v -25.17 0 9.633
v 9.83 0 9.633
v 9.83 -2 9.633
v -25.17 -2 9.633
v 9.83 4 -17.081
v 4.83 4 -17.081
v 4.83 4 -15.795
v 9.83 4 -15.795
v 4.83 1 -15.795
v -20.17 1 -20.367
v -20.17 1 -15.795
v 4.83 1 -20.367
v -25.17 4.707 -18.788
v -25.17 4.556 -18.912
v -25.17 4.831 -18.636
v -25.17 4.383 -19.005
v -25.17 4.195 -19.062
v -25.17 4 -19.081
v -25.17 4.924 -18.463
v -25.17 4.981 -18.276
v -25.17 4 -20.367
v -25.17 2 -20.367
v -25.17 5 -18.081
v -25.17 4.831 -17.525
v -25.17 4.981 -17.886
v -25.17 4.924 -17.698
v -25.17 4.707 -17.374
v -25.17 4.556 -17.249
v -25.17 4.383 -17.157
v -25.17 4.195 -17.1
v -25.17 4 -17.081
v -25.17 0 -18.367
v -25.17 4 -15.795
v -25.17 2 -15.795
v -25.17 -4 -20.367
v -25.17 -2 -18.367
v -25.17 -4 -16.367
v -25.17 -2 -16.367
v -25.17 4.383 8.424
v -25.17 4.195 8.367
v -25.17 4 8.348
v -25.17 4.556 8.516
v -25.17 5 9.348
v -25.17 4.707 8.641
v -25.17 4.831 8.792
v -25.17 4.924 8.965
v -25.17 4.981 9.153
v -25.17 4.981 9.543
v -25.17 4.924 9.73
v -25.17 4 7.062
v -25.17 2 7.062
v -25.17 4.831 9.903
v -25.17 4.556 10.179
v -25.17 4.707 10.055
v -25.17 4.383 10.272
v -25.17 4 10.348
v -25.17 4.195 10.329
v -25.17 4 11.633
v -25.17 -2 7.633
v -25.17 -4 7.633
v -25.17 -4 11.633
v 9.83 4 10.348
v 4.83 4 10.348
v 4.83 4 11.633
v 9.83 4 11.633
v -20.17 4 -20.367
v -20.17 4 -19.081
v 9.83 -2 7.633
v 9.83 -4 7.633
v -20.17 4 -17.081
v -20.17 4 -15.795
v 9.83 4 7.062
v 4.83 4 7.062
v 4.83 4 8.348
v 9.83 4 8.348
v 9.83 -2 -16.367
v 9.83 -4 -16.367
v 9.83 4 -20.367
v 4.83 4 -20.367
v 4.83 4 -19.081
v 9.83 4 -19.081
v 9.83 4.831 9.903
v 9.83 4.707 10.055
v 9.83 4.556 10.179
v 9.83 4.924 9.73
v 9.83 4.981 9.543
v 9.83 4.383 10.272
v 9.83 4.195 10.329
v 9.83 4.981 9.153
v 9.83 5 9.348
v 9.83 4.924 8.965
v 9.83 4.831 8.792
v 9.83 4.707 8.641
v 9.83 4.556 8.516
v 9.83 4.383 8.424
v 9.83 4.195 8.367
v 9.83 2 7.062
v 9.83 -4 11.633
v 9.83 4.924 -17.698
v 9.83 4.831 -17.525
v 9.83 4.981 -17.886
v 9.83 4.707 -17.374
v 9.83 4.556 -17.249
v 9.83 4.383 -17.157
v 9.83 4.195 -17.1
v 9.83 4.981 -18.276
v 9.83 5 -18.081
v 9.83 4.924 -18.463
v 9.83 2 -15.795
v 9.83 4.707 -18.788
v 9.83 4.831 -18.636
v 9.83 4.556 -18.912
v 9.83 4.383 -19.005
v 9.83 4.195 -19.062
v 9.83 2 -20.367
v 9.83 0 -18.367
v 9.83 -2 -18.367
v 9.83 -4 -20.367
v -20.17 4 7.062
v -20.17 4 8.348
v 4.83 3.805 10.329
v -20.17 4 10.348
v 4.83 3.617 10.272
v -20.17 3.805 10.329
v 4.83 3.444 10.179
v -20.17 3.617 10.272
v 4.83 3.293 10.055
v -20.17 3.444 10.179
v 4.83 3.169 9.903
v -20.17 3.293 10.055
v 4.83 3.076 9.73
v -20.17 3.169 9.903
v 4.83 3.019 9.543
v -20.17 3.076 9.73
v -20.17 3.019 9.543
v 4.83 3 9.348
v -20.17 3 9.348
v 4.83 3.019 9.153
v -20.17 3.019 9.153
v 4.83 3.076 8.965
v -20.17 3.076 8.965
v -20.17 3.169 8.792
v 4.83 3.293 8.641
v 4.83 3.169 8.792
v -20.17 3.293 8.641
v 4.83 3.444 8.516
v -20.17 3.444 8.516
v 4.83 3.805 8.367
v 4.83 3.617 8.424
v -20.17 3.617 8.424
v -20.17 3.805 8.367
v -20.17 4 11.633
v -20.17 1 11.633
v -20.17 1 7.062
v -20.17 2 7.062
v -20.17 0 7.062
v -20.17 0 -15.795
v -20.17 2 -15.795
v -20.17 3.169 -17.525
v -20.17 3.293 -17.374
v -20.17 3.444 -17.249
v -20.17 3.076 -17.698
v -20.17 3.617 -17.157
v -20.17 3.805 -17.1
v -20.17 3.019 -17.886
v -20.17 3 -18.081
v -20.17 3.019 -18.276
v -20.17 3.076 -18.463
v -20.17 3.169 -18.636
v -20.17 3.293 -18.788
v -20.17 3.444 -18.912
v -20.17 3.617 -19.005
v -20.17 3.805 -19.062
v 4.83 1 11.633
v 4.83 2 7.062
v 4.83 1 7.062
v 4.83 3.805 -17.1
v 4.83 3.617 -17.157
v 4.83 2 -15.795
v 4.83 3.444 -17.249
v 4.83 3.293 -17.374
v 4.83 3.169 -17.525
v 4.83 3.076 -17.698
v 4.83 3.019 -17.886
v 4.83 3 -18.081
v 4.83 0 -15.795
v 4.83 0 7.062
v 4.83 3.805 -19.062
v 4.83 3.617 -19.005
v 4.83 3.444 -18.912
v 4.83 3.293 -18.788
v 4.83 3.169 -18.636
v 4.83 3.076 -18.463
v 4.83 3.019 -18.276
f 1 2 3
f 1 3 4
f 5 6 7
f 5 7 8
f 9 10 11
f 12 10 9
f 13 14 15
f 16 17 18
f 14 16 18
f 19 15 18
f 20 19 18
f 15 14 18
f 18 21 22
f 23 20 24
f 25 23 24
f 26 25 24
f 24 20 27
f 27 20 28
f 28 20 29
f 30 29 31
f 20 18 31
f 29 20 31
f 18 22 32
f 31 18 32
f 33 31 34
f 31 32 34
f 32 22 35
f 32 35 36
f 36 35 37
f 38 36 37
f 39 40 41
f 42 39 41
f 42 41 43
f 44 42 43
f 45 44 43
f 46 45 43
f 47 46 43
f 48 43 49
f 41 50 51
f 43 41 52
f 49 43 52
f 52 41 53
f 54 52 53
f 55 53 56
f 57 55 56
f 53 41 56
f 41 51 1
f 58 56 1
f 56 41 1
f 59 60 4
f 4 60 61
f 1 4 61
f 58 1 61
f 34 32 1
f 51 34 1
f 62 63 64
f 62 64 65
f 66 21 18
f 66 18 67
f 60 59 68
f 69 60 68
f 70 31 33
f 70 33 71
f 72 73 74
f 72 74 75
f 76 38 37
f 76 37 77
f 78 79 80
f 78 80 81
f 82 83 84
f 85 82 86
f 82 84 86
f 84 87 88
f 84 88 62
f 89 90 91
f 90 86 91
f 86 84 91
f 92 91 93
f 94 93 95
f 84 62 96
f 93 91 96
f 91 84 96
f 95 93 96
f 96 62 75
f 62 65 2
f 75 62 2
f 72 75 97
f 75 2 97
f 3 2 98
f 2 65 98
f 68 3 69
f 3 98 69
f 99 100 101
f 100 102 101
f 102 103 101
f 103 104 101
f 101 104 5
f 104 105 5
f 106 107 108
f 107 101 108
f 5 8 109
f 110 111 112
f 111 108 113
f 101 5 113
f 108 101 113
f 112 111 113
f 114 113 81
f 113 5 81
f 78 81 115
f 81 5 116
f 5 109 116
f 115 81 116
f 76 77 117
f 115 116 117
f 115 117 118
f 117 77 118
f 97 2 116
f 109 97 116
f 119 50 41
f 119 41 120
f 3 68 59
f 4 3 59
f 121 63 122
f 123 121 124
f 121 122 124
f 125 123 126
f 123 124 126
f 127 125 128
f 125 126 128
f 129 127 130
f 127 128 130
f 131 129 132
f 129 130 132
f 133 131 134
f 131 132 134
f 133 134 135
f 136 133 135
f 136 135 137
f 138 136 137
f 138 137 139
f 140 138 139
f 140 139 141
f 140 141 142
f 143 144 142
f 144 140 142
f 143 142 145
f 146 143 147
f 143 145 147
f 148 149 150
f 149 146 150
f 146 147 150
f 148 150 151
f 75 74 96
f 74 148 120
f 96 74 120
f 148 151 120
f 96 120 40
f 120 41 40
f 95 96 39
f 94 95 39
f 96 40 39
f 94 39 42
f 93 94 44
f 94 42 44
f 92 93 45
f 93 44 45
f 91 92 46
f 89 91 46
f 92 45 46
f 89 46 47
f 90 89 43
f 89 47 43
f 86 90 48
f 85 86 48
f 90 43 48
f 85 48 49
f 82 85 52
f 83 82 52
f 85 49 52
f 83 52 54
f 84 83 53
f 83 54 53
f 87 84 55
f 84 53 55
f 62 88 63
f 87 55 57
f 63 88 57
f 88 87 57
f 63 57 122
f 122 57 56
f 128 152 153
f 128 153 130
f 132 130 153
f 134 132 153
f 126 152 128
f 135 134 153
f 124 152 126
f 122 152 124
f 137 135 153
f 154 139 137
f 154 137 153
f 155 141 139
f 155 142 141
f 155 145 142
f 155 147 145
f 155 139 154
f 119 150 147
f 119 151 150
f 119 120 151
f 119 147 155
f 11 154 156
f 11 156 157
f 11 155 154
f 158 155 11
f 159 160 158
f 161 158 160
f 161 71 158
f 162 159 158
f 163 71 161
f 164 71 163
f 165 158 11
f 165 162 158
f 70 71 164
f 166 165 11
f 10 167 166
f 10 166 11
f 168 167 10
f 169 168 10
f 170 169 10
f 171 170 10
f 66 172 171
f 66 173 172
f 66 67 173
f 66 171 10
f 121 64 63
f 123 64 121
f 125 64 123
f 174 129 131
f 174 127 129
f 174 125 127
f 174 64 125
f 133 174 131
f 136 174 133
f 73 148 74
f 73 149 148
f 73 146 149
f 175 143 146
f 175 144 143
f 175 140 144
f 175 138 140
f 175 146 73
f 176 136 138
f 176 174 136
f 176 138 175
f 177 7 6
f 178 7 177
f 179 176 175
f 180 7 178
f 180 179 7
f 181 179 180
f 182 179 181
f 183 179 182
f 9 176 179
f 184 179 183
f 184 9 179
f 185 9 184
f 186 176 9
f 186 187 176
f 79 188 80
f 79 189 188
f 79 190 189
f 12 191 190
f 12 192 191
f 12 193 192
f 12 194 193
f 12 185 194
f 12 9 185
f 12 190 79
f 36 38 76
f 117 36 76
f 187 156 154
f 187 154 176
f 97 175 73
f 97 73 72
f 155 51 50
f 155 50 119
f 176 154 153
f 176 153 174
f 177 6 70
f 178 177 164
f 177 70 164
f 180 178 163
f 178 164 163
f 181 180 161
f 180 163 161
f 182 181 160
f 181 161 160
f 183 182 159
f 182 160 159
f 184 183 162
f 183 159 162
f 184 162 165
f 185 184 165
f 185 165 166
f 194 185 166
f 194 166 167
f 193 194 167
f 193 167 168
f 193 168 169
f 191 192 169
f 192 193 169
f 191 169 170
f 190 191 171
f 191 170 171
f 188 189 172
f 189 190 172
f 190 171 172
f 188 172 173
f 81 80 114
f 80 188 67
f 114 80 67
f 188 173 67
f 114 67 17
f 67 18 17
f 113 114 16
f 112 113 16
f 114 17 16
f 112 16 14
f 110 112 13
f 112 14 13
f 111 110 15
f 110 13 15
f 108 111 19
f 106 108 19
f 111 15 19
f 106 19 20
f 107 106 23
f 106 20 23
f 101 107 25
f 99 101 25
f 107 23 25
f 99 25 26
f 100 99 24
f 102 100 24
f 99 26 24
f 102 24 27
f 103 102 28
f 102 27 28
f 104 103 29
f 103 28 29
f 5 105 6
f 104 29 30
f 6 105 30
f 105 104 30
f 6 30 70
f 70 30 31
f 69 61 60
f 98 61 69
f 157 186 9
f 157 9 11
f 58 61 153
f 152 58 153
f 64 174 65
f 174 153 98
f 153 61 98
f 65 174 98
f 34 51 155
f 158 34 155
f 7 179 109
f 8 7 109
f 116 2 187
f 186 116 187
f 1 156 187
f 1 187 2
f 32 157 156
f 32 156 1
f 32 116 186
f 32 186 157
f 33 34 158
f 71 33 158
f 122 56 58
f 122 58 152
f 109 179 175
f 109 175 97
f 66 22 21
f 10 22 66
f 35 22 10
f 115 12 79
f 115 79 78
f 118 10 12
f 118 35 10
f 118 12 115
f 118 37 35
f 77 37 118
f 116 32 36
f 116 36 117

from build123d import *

# Parameters (mm, degrees)
SKETCH_1_W          = 35
SKETCH_1_H          = 32
EXTRUDE_1_DEPTH     = 2
CUT_EXTRUDE_2_DEPTH = 2
SKETCH_3_W          = 35
SKETCH_3_H          = 4
EXTRUDE_2_DEPTH     = 4
SKETCH_4_W          = 35
SKETCH_4_H          = 2
CUT_EXTRUDE_3_DEPTH = 2
SKETCH_5_W          = 35
SKETCH_5_H          = 2
CUT_EXTRUDE_4_DEPTH = 2
SKETCH_6_W          = 5
SKETCH_6_H          = 4.571428571
SKETCH_6_H_2        = 4.571428572
EXTRUDE_3_DEPTH     = 2
SKETCH_7_W          = 25
SKETCH_7_H          = 4.571428572
SKETCH_7_H_2        = 4.571428571
CUT_EXTRUDE_5_DEPTH = 1
SKETCH_9_R          = 1
EXTRUDE_4_DEPTH     = 28
EXTRUDE_START       = -5
SKETCH_9_3_R        = 1
EXTRUDE_5_DEPTH     = 35


with BuildPart() as part:
    # 草图1 → 凸台-拉伸1 (new body)
    with BuildSketch(Plane(origin=(0, 0, 0), x_dir=(1, 0, 0), z_dir=(0, 1, 0))):
        with Locations((-7.669902913, 4.366504854)):
            Rectangle(SKETCH_1_W, SKETCH_1_H)
    extrude(amount=EXTRUDE_1_DEPTH)

    # 草图1<3> → 切除-拉伸2 (cut)
    with BuildSketch(Plane(origin=(0, 0, 0), x_dir=(1, 0, 0), z_dir=(0, 1, 0))):
        Polygon((-7.669902913, 4.366504854), (-20.169902913, 15.795076283), (-20.169902913, -7.062066574), align=None)
        Polygon((4.830097087, 15.795076283), (-20.169902913, 15.795076283), (-7.669902913, 4.366504854), align=None)
        Polygon((4.830097087, 15.795076283), (-7.669902913, 4.366504854), (4.830097087, -7.062066574), align=None)
        Polygon((4.830097087, -7.062066574), (-7.669902913, 4.366504854), (-20.169902913, -7.062066574), align=None)
    extrude(amount=CUT_EXTRUDE_2_DEPTH, mode=Mode.SUBTRACT)

    # 草图3 → 凸台-拉伸2 (add)
    with BuildSketch(Plane.XZ):
        with Locations((-7.669902913, -18.366504854)):
            Rectangle(SKETCH_3_W, SKETCH_3_H)
        with Locations((-7.669902913, 9.633495146)):
            Rectangle(SKETCH_3_W, SKETCH_3_H)
    extrude(amount=EXTRUDE_2_DEPTH)

    # 草图4 → 切除-拉伸3 (cut)
    with BuildSketch(Plane(origin=(0, 0, 7.633495146), x_dir=(-1, 0, 0), z_dir=(0, 0, -1))):
        with Locations((7.669902913, -1)):
            Rectangle(SKETCH_4_W, SKETCH_4_H)
    extrude(amount=-CUT_EXTRUDE_3_DEPTH, mode=Mode.SUBTRACT)

    # 草图5 → 切除-拉伸4 (cut)
    with BuildSketch(Plane.XY.offset(-16.366504854)):
        with Locations((-7.669902913, -1)):
            Rectangle(SKETCH_5_W, SKETCH_5_H)
    extrude(amount=-CUT_EXTRUDE_4_DEPTH, mode=Mode.SUBTRACT)

    # 草图6 → 凸台-拉伸3 (add)
    with BuildSketch(Plane(origin=(0, 2, 0), x_dir=(1, 0, 0), z_dir=(0, 1, 0))):
        with Locations((7.330097087, 18.080790568)):
            Rectangle(SKETCH_6_W, SKETCH_6_H)
        with Locations((7.330097087, -9.34778086)):
            Rectangle(SKETCH_6_W, SKETCH_6_H_2)
        with Locations((-22.669902913, -9.34778086)):
            Rectangle(SKETCH_6_W, SKETCH_6_H_2)
        with Locations((-22.669902913, 18.080790568)):
            Rectangle(SKETCH_6_W, SKETCH_6_H)
    extrude(amount=EXTRUDE_3_DEPTH)

    # 草图7 → 切除-拉伸5 (cut)
    with BuildSketch(Plane(origin=(0, 2, 0), x_dir=(1, 0, 0), z_dir=(0, 1, 0))):
        with Locations((-7.669902913, -9.34778086)):
            Rectangle(SKETCH_7_W, SKETCH_7_H)
        with Locations((-7.669902913, 18.080790568)):
            Rectangle(SKETCH_7_W, SKETCH_7_H_2)
    extrude(amount=-CUT_EXTRUDE_5_DEPTH, mode=Mode.SUBTRACT)

    # 草图9 → 凸台-拉伸4 (add)
    with BuildSketch(Plane(origin=(-20.169902913, 0, 0), x_dir=(0, 0, -1), z_dir=(1, 0, 0))):
        with BuildLine():
            Line((17.080790569, 4), (19.080790569, 4))
            ThreePointArc((19.080790569, 4), (18.080790569, 5), (17.080790569, 4))
        make_face()
        with BuildLine():
            ThreePointArc((17.080790569, 4), (18.080790569, 3), (19.080790569, 4))
            Line((19.080790569, 4), (17.080790569, 4))
        make_face()
        with Locations(Location((-9.34778086, 4, 0), (0, 0, 180))):
            Circle(SKETCH_9_R)
    extrude(amount=EXTRUDE_4_DEPTH)

    # 草图9<3> → 凸台-拉伸5 (add)
    with BuildSketch(Plane(origin=(-20.169902913, 0, 0), x_dir=(0, 0, -1), z_dir=(1, 0, 0)).offset(EXTRUDE_START)):
        with Locations(Location((18.080790569, 4, 0), (0, 0, 180))):
            Circle(SKETCH_9_3_R)
        with Locations(Location((-9.34778086, 4, 0), (0, 0, 180))):
            Circle(SKETCH_9_3_R)
    extrude(amount=EXTRUDE_5_DEPTH)


solid = part.part
